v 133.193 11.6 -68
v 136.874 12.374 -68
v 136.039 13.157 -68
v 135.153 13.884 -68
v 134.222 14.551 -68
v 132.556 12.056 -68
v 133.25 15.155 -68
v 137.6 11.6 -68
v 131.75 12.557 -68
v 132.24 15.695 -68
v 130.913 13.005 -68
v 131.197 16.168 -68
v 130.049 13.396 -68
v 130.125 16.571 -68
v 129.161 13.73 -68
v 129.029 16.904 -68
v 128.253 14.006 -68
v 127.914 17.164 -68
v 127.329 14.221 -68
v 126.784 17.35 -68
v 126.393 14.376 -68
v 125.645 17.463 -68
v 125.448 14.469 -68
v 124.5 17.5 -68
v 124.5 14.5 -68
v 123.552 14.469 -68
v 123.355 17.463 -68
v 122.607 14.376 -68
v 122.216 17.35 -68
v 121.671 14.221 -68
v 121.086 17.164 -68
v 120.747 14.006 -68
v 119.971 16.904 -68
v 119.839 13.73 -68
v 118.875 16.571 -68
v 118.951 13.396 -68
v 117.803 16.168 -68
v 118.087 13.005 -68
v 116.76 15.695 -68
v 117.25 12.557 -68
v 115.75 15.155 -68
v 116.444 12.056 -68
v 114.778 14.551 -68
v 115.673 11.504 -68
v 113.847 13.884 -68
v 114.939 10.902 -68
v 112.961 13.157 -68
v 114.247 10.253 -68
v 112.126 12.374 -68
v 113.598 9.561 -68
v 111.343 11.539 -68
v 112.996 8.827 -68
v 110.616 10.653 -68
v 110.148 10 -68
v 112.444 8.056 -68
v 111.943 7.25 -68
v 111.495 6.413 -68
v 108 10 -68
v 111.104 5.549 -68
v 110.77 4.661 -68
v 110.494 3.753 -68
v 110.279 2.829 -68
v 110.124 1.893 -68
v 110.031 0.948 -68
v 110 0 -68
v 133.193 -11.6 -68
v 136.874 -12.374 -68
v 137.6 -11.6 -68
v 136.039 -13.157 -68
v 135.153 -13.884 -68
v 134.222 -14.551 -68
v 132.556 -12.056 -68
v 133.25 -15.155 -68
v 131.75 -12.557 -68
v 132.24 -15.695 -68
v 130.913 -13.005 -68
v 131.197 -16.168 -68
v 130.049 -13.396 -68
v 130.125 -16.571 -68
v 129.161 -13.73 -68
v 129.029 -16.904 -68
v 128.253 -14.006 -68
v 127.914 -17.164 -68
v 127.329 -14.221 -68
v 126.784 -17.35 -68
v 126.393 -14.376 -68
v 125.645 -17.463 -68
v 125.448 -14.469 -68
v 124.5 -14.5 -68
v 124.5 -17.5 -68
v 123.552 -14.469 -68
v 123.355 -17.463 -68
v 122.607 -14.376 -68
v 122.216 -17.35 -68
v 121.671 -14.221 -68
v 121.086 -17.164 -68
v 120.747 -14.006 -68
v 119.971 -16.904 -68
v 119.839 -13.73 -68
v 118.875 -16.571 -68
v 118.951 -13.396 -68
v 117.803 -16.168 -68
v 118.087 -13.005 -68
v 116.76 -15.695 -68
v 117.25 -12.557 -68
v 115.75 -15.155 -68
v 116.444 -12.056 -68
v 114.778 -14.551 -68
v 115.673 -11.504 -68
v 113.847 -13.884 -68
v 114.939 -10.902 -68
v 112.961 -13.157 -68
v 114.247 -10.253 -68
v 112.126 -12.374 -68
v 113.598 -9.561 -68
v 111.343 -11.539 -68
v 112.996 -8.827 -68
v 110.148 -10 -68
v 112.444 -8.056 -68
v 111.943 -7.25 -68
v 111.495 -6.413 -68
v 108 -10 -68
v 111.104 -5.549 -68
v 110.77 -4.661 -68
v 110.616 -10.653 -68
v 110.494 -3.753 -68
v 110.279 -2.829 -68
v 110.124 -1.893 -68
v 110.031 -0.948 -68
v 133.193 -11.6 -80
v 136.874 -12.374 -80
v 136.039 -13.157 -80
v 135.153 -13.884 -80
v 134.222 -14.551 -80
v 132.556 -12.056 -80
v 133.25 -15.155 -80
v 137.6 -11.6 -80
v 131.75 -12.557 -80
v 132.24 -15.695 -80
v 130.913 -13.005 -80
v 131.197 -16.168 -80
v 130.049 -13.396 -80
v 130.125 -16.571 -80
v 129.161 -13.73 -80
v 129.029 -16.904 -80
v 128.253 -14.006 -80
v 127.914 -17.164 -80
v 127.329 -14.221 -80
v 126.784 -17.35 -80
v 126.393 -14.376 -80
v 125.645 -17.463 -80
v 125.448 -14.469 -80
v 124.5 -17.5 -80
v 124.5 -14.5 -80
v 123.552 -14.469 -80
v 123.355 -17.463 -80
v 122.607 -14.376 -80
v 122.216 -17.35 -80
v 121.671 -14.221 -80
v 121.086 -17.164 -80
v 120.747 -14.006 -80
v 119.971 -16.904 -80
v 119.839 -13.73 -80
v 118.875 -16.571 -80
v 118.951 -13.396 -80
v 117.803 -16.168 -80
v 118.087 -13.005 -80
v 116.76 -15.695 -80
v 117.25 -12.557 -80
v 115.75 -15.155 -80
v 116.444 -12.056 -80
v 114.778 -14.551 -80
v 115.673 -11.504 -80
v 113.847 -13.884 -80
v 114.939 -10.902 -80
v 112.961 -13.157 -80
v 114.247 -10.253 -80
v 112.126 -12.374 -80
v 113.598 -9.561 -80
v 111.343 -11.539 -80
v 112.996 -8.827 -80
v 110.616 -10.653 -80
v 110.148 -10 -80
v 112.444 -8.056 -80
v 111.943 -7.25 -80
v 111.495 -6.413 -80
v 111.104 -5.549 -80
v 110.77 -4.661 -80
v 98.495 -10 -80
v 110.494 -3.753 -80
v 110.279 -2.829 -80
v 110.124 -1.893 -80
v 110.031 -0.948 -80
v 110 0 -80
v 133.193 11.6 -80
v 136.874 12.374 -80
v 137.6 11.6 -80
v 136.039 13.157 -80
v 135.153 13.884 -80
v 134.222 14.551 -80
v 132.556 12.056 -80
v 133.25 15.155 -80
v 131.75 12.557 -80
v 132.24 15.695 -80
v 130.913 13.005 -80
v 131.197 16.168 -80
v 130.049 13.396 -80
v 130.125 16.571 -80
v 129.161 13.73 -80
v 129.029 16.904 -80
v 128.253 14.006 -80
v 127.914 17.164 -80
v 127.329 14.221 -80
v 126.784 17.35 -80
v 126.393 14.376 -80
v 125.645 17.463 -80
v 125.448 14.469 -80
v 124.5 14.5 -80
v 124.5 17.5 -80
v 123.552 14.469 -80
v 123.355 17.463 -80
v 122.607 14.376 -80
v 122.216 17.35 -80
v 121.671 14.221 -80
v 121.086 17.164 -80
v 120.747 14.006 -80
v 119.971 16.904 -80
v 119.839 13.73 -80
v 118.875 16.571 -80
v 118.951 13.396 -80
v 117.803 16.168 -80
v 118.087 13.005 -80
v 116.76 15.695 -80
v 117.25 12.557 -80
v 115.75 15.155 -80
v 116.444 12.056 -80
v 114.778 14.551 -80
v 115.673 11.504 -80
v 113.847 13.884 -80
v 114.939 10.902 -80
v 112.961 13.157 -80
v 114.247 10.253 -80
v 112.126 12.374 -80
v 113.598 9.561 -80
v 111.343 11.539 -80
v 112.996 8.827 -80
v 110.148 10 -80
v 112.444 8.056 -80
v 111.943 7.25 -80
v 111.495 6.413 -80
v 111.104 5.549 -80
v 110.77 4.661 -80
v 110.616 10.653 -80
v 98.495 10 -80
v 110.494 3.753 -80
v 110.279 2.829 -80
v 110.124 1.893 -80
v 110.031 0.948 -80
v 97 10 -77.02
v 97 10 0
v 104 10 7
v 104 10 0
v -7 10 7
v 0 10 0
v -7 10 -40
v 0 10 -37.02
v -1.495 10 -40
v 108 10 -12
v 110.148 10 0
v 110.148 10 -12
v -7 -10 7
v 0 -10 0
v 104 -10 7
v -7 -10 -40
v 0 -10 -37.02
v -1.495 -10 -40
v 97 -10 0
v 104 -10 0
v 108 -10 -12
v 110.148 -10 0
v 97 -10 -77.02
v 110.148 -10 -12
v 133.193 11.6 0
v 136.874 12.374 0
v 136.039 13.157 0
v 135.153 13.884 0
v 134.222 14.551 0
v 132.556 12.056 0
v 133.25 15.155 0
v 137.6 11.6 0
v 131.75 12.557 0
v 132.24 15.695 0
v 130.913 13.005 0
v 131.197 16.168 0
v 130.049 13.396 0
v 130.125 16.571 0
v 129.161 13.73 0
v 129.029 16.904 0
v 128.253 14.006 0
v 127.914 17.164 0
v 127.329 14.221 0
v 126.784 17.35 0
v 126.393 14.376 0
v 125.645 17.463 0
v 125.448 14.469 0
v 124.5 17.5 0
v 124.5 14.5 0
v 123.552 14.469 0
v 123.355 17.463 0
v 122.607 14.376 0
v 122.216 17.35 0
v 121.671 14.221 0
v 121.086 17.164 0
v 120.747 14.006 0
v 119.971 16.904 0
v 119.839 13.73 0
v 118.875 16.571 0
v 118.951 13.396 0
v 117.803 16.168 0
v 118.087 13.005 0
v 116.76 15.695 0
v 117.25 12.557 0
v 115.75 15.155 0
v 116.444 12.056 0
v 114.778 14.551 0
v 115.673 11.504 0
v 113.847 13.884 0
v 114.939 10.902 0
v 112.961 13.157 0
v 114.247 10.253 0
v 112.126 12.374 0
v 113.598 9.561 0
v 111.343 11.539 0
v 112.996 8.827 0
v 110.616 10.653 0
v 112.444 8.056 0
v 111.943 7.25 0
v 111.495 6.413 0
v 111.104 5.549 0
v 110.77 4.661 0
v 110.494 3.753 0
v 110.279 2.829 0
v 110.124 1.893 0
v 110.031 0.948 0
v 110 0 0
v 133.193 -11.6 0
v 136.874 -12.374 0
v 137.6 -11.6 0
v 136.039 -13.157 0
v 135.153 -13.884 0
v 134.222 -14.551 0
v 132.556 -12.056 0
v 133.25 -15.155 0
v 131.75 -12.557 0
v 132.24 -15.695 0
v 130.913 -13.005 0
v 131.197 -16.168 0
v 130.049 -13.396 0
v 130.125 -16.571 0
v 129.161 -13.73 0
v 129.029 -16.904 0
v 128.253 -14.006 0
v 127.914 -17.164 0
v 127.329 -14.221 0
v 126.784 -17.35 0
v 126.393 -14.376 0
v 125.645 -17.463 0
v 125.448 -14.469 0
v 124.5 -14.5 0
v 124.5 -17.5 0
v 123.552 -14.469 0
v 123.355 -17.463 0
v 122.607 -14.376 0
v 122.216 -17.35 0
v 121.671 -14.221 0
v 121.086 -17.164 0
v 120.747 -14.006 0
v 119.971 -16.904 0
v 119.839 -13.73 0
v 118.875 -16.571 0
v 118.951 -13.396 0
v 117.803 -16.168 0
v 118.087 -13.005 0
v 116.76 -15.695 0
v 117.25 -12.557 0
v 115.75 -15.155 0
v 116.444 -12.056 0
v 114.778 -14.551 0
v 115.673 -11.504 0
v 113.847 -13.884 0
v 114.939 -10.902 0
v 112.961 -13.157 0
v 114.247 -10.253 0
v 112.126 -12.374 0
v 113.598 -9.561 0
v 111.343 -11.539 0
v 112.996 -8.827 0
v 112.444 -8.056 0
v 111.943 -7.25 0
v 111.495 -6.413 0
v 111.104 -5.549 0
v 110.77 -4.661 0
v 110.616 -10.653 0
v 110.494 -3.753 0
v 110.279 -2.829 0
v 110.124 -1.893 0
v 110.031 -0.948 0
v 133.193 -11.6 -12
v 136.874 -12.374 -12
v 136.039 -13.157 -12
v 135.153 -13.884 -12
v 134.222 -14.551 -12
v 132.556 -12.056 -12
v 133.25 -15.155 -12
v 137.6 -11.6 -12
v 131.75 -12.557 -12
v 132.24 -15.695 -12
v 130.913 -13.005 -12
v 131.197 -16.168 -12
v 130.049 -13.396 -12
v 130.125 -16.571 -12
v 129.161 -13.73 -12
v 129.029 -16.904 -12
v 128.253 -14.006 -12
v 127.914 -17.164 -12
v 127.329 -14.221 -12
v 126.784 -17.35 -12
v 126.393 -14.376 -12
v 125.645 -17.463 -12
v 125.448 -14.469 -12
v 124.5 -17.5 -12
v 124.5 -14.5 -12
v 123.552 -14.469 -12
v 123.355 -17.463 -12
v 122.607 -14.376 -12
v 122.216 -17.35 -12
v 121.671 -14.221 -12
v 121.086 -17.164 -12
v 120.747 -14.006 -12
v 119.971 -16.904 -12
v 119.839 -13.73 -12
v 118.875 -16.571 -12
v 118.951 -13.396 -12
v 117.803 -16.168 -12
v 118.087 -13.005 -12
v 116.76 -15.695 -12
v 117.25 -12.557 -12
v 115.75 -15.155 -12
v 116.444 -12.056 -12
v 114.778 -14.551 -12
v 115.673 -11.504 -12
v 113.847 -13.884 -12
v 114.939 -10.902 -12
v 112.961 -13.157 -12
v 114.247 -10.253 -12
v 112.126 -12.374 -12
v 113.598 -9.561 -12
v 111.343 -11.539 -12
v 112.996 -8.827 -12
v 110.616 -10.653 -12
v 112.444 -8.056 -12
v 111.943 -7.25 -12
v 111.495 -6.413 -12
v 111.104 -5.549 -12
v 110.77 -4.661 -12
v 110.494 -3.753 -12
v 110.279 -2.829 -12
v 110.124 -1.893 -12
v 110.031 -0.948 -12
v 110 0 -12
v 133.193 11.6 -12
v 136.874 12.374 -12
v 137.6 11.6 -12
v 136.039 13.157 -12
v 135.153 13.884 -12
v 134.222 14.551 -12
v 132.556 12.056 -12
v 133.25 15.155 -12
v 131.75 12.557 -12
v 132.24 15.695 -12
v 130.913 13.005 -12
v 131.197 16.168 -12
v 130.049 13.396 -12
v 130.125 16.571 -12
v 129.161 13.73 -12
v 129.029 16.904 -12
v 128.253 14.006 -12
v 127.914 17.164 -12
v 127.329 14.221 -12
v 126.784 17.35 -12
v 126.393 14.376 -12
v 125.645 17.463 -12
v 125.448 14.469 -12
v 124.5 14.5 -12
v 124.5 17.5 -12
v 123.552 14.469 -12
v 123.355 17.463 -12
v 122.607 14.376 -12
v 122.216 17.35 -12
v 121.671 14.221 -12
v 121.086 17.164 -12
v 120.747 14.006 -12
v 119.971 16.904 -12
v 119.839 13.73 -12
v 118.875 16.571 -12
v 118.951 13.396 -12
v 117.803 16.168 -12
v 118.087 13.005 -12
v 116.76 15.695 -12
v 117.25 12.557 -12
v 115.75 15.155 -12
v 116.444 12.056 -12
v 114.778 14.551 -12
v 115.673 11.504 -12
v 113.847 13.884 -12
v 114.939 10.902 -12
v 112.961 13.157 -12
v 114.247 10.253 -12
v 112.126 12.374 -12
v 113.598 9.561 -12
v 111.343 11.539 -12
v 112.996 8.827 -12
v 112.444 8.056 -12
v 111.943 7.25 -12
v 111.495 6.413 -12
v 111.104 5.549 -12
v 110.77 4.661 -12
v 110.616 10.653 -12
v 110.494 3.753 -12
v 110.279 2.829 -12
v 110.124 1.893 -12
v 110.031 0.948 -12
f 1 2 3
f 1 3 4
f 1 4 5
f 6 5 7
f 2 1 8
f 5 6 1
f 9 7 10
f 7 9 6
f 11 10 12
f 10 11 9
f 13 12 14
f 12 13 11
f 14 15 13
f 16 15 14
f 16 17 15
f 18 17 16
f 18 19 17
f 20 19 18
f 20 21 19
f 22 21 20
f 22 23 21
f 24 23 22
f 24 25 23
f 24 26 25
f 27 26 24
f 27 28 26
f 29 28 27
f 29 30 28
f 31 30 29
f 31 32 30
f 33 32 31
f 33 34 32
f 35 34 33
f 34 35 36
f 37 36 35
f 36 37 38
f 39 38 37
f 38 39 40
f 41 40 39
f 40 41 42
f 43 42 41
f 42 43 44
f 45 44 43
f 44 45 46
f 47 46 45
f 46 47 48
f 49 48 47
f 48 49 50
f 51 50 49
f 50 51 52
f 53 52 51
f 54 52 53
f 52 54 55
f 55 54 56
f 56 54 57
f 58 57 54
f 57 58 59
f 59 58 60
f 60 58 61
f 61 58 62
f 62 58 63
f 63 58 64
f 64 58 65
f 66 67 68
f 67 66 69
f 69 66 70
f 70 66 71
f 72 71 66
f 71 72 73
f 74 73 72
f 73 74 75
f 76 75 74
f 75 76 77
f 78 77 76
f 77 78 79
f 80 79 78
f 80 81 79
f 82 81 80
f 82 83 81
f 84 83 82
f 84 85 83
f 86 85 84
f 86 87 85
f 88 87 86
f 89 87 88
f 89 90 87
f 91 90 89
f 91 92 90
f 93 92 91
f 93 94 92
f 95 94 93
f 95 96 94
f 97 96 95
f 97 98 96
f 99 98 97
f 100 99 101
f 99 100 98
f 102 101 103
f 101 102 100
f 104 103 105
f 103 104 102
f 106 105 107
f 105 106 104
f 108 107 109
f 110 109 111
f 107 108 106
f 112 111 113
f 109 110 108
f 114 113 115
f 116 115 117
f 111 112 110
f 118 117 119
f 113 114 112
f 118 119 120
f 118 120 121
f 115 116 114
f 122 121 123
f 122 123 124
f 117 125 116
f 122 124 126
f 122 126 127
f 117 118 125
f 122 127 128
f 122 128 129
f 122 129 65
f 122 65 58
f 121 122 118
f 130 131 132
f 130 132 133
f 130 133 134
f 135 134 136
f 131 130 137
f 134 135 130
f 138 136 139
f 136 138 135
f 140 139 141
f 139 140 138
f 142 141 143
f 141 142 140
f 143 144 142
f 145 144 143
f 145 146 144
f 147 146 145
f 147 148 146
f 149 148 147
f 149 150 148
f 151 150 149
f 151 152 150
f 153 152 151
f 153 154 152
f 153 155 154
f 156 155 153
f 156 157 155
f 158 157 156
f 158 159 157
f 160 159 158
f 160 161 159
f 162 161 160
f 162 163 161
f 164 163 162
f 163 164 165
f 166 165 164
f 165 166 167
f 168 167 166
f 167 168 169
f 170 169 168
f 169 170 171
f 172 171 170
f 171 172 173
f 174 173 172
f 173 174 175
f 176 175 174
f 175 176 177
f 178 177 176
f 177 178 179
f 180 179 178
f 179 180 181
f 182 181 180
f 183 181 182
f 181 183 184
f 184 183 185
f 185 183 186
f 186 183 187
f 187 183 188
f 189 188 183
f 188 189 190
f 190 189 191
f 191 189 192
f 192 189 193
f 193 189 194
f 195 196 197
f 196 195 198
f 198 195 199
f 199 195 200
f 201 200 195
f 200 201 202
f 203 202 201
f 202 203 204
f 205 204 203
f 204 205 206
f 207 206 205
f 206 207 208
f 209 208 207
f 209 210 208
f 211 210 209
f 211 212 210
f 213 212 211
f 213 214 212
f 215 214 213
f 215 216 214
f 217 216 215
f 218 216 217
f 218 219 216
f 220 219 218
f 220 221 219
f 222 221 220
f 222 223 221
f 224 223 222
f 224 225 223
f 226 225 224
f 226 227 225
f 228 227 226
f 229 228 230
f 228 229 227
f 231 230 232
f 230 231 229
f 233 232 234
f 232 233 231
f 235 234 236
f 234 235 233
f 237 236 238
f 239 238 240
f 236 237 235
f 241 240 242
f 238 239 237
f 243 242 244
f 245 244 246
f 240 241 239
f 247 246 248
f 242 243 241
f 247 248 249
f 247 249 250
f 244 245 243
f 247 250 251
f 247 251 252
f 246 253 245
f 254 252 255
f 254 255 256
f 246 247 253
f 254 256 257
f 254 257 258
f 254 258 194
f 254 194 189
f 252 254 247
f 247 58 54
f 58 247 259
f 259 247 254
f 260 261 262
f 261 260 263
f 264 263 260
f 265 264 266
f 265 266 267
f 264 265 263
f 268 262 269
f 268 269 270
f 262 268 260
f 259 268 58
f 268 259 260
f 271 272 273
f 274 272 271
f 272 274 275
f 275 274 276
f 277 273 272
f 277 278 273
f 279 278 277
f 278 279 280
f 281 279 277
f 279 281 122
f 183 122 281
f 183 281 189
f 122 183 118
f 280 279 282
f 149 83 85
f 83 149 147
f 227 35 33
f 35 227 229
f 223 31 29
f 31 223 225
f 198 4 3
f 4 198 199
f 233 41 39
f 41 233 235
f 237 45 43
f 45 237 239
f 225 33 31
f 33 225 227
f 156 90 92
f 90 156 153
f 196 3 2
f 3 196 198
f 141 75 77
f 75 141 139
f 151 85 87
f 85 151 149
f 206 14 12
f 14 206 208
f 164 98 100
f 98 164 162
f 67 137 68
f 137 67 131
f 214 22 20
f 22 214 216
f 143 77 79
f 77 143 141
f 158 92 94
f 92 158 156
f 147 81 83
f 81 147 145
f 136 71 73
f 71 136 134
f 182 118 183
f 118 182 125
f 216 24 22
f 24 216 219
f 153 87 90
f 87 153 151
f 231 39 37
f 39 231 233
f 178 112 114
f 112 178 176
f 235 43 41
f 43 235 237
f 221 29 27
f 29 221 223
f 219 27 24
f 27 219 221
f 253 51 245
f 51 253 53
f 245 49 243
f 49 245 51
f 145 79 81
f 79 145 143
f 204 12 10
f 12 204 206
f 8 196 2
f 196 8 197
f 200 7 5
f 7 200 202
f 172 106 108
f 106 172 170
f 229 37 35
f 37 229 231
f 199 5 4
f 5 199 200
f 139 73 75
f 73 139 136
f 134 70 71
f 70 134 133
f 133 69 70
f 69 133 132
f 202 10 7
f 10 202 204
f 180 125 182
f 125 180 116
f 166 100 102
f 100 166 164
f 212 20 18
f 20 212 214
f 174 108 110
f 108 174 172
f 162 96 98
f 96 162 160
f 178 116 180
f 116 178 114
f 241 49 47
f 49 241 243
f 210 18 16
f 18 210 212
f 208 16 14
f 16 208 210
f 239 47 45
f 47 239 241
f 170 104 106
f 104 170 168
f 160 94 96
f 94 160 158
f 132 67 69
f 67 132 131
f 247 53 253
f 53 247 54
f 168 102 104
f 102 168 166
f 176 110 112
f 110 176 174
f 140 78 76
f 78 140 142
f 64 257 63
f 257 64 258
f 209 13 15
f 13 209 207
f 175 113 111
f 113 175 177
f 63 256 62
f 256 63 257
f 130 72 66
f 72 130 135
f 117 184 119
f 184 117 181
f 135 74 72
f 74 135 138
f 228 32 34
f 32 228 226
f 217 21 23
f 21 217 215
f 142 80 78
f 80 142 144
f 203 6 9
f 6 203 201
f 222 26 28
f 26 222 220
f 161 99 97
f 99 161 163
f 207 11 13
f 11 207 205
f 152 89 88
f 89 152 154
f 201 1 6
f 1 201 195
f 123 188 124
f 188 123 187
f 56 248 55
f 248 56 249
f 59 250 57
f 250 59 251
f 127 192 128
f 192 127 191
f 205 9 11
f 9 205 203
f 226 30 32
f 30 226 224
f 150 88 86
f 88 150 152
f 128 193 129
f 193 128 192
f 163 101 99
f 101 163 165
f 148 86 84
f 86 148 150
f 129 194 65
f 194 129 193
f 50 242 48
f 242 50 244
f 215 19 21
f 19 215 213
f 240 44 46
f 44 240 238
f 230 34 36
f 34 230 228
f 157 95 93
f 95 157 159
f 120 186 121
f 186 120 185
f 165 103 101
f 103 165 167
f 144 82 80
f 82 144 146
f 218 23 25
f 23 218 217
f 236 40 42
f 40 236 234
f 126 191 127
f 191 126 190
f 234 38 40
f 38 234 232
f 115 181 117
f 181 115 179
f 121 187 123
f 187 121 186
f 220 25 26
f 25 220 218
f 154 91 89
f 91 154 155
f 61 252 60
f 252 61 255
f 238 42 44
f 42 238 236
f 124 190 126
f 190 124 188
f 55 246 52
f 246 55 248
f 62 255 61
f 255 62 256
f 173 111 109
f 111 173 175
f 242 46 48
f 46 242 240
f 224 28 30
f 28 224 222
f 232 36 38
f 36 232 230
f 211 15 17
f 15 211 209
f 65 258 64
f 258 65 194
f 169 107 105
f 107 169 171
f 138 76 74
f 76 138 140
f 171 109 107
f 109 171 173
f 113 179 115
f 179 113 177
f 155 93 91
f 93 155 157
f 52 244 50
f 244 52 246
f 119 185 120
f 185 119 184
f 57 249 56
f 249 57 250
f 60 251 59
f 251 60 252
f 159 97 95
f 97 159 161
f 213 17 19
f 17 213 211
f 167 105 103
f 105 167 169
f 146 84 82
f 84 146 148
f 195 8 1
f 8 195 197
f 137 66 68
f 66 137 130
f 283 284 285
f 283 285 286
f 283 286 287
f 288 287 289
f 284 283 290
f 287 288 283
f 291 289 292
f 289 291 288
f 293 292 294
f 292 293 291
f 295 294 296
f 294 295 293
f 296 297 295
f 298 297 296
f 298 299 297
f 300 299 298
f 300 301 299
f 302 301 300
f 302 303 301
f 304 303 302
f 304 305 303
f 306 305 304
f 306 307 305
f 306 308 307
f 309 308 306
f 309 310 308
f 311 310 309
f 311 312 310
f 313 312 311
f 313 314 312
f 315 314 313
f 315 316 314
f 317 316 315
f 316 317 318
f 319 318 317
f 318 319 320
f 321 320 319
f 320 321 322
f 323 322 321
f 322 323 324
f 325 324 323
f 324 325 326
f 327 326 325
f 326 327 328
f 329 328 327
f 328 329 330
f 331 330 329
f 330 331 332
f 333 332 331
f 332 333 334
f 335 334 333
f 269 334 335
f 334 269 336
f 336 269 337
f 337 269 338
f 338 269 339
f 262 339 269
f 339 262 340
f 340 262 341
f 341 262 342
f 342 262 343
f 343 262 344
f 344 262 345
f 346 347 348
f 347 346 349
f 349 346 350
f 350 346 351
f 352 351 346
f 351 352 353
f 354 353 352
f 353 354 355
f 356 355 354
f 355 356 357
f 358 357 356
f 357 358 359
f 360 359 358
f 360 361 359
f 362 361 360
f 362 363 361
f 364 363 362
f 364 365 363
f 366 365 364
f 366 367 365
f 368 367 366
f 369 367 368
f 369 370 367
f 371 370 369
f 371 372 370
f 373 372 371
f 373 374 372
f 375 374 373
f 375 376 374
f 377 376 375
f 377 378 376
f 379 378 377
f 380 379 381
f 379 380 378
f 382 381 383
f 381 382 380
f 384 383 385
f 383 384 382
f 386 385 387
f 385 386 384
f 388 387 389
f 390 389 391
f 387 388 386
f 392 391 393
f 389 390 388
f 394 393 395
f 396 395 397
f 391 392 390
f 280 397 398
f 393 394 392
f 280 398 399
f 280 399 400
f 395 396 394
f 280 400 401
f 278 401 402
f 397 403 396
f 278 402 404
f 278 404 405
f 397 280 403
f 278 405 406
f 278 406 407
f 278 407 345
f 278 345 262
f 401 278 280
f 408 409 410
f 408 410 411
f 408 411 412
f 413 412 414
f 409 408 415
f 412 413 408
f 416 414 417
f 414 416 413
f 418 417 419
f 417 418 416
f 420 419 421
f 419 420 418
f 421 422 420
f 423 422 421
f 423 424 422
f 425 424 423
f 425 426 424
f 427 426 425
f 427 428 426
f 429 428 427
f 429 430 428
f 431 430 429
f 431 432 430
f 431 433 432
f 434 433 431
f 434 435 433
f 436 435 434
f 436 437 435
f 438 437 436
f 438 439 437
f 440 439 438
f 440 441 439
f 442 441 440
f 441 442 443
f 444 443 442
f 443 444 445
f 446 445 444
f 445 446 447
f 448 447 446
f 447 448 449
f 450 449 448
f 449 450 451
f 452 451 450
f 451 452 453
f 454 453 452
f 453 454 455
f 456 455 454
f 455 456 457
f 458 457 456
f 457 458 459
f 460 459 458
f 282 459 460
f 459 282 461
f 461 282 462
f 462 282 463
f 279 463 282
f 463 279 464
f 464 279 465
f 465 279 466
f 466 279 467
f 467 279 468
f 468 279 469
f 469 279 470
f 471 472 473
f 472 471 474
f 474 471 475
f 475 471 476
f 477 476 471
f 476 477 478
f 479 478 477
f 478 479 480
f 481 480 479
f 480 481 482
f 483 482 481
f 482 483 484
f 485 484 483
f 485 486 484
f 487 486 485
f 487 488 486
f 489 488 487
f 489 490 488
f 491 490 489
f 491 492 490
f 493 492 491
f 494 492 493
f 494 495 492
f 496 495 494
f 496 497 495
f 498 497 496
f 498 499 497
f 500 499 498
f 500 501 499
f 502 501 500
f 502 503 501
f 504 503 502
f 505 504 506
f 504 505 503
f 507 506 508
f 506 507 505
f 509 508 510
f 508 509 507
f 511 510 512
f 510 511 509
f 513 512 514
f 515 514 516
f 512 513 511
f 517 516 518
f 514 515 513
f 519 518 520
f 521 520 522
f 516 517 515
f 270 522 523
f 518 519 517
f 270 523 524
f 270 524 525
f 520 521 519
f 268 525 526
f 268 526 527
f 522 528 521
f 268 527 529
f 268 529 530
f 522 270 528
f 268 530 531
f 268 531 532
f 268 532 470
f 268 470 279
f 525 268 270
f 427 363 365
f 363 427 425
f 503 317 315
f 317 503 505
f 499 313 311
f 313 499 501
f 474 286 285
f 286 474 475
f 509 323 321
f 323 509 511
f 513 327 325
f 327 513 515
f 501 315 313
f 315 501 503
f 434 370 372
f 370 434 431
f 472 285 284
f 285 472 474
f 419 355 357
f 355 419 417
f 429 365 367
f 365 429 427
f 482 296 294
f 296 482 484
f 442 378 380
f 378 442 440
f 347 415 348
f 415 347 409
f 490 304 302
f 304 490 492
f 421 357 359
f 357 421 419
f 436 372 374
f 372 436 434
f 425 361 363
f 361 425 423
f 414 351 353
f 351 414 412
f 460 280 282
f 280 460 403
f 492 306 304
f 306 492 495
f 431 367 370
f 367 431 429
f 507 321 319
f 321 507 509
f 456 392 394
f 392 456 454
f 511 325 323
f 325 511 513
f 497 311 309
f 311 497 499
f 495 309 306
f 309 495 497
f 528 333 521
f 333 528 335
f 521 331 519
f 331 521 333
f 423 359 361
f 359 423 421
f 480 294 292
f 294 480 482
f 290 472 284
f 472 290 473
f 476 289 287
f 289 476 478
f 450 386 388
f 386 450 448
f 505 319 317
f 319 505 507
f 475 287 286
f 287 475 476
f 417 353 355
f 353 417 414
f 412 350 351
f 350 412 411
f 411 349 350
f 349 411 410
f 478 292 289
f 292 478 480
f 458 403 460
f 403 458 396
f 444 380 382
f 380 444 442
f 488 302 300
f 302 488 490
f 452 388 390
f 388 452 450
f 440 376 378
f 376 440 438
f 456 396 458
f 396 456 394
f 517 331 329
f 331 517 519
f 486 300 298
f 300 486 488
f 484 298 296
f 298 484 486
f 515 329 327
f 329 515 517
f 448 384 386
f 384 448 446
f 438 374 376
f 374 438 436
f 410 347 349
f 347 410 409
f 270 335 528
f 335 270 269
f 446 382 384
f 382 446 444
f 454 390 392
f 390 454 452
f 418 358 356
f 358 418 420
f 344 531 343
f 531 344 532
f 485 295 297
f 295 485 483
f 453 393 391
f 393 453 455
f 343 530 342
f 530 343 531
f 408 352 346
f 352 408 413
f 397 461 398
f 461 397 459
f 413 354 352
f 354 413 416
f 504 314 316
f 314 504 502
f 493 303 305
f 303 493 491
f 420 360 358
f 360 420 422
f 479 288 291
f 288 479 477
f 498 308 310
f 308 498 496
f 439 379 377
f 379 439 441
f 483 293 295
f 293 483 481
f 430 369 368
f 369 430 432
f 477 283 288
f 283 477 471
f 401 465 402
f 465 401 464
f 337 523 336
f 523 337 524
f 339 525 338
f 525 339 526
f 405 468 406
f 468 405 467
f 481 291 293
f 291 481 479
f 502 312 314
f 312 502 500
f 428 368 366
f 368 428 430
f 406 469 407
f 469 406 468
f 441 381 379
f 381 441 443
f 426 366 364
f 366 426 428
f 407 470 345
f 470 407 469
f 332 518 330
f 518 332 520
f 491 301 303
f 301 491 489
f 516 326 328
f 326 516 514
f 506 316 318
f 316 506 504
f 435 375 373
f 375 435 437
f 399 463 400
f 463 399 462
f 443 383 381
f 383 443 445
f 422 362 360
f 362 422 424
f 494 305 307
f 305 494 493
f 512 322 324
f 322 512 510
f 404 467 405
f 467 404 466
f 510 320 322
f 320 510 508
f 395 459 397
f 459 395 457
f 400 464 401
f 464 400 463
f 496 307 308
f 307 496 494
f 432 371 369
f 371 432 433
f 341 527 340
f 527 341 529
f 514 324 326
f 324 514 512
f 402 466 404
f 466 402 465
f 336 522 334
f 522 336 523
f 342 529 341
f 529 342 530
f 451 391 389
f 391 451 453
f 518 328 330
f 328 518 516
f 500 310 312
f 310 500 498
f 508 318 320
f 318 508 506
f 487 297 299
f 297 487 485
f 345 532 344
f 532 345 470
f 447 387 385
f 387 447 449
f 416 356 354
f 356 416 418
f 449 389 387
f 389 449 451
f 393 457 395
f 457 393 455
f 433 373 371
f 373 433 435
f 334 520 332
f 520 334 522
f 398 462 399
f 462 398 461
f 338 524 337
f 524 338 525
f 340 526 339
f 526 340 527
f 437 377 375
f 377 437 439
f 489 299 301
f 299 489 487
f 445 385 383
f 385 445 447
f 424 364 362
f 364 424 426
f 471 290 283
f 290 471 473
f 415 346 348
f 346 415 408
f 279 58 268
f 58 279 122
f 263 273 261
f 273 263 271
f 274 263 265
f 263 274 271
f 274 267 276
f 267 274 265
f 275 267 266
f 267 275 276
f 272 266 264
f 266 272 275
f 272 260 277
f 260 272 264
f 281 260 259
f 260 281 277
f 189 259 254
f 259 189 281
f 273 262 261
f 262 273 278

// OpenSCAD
// Sink hose clip: C clamp that hooks over the sink edge,
// with snap-in hose rings on the outside leg.
// One solid model - cut it in the slicer (with connectors) for printing.

sink_thickness = 97;    // outer lip to inside of the bowl
squeeze        = 0;     // gap is this much smaller than the edge (negative = looser)
clip_width     = 20;    // width of the clamp
wall           = 7;     // clamp wall thickness (legs and bridge)
inner_leg      = 40;    // leg that goes into the bowl
outer_leg      = 80;    // leg on the outside, carries the rings

hose_d         = 29;    // MEASURE: hose outer diameter (+0.5 clearance)
ring_wall      = 3;     // ring wall thickness
ring_h         = 12;    // ring height
ring_count     = 2;
ring_opening   = 0.8;   // snap opening as a fraction of hose_d (smaller = tighter snap)
plate_t        = 4;     // backing plate joining the rings into one piece
$fn = 96;

gap      = sink_thickness - squeeze;
ring_od  = hose_d + 2*ring_wall;
leg_face = gap + wall;                         // outer face of the outside leg
ring_cx  = leg_face + plate_t + ring_od/2 - 1; // ring centre, slightly merged into the plate
block_w  = min(clip_width, ring_od * 0.6);

// bottom of each ring along the outer leg (sink edge top at z = 0)
z_lo = -outer_leg;
z_hi = -ring_h;
function ring_z(i) = ring_count == 1 ? z_hi
                   : z_lo + i * (z_hi - z_lo) / (ring_count - 1);

module clip() {
    // C profile drawn in XZ, extruded along Y
    rotate([90, 0, 0])
        linear_extrude(height = clip_width, center = true)
            difference() {
                union() {
                    translate([-wall, -inner_leg]) square([wall, inner_leg + wall]); // inner leg
                    translate([gap, -outer_leg])   square([wall, outer_leg + wall]); // outer leg
                    translate([-wall, 0])          square([gap + 2*wall, wall]);     // bridge
                }
                // lead-in chamfers on the leg tips so it slides on easier
                translate([0, -inner_leg])
                    polygon([[0.01, -0.01], [0.01, 3], [-1.5, -0.01]]);
                translate([gap, -outer_leg])
                    polygon([[-0.01, -0.01], [-0.01, 3], [1.5, -0.01]]);
            }
}

module ring() {
    difference() {
        union() {
            translate([leg_face + plate_t - 0.01, -block_w/2, 0])
                cube([ring_cx - leg_face - plate_t, block_w, ring_h]);
            translate([ring_cx, 0, 0]) cylinder(d = ring_od, h = ring_h);
        }
        translate([ring_cx, 0, -1]) cylinder(d = hose_d, h = ring_h + 2);
        // snap opening facing away from the sink
        translate([ring_cx, -hose_d*ring_opening/2, -1])
            cube([ring_od, hose_d*ring_opening, ring_h + 2]);
    }
}

module rings() {
    // backing plate on the outer leg; cut at the leg face to split the rings off as one piece
    translate([leg_face - 0.01, -clip_width/2, ring_z(0)])
        cube([plate_t + 0.01, clip_width, ring_z(ring_count - 1) + ring_h - ring_z(0)]);
    for (i = [0 : ring_count - 1])
        translate([0, 0, ring_z(i)]) ring();
}

clip();
rings();
